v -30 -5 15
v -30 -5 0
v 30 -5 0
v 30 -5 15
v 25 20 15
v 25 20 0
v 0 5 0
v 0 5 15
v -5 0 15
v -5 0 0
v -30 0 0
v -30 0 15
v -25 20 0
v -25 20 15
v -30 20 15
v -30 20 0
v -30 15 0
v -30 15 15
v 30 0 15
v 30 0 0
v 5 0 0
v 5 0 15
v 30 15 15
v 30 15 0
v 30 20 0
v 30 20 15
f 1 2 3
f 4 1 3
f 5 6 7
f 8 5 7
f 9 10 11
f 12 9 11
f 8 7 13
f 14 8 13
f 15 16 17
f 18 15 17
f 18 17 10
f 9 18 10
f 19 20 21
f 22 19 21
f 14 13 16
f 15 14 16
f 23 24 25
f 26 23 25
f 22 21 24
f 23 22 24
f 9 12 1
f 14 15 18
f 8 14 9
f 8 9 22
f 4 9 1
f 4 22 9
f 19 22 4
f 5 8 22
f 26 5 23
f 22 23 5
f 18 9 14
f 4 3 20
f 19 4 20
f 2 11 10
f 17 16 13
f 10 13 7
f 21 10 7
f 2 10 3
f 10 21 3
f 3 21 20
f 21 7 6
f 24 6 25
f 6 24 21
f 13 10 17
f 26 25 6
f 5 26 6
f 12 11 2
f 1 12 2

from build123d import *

# Parameters (mm, degrees)
F1_DEPTH = 15


with BuildPart() as f1:
    # F0 (on Top) → F1 (new body)
    with BuildSketch(Plane.XY):
        Polygon((-5, 0), (0, 0), (0, 5), (-25, 20), (-30, 20), (-30, 15), align=None)
        Polygon((0, 5), (0, 0), (5, 0), (30, 15), (30, 20), (25, 20), align=None)
        Polygon((5, 0), (0, 0), (-5, 0), (-30, 0), (-30, -5), (30, -5), (30, 0), align=None)
    extrude(amount=F1_DEPTH)


solid = f1.part
